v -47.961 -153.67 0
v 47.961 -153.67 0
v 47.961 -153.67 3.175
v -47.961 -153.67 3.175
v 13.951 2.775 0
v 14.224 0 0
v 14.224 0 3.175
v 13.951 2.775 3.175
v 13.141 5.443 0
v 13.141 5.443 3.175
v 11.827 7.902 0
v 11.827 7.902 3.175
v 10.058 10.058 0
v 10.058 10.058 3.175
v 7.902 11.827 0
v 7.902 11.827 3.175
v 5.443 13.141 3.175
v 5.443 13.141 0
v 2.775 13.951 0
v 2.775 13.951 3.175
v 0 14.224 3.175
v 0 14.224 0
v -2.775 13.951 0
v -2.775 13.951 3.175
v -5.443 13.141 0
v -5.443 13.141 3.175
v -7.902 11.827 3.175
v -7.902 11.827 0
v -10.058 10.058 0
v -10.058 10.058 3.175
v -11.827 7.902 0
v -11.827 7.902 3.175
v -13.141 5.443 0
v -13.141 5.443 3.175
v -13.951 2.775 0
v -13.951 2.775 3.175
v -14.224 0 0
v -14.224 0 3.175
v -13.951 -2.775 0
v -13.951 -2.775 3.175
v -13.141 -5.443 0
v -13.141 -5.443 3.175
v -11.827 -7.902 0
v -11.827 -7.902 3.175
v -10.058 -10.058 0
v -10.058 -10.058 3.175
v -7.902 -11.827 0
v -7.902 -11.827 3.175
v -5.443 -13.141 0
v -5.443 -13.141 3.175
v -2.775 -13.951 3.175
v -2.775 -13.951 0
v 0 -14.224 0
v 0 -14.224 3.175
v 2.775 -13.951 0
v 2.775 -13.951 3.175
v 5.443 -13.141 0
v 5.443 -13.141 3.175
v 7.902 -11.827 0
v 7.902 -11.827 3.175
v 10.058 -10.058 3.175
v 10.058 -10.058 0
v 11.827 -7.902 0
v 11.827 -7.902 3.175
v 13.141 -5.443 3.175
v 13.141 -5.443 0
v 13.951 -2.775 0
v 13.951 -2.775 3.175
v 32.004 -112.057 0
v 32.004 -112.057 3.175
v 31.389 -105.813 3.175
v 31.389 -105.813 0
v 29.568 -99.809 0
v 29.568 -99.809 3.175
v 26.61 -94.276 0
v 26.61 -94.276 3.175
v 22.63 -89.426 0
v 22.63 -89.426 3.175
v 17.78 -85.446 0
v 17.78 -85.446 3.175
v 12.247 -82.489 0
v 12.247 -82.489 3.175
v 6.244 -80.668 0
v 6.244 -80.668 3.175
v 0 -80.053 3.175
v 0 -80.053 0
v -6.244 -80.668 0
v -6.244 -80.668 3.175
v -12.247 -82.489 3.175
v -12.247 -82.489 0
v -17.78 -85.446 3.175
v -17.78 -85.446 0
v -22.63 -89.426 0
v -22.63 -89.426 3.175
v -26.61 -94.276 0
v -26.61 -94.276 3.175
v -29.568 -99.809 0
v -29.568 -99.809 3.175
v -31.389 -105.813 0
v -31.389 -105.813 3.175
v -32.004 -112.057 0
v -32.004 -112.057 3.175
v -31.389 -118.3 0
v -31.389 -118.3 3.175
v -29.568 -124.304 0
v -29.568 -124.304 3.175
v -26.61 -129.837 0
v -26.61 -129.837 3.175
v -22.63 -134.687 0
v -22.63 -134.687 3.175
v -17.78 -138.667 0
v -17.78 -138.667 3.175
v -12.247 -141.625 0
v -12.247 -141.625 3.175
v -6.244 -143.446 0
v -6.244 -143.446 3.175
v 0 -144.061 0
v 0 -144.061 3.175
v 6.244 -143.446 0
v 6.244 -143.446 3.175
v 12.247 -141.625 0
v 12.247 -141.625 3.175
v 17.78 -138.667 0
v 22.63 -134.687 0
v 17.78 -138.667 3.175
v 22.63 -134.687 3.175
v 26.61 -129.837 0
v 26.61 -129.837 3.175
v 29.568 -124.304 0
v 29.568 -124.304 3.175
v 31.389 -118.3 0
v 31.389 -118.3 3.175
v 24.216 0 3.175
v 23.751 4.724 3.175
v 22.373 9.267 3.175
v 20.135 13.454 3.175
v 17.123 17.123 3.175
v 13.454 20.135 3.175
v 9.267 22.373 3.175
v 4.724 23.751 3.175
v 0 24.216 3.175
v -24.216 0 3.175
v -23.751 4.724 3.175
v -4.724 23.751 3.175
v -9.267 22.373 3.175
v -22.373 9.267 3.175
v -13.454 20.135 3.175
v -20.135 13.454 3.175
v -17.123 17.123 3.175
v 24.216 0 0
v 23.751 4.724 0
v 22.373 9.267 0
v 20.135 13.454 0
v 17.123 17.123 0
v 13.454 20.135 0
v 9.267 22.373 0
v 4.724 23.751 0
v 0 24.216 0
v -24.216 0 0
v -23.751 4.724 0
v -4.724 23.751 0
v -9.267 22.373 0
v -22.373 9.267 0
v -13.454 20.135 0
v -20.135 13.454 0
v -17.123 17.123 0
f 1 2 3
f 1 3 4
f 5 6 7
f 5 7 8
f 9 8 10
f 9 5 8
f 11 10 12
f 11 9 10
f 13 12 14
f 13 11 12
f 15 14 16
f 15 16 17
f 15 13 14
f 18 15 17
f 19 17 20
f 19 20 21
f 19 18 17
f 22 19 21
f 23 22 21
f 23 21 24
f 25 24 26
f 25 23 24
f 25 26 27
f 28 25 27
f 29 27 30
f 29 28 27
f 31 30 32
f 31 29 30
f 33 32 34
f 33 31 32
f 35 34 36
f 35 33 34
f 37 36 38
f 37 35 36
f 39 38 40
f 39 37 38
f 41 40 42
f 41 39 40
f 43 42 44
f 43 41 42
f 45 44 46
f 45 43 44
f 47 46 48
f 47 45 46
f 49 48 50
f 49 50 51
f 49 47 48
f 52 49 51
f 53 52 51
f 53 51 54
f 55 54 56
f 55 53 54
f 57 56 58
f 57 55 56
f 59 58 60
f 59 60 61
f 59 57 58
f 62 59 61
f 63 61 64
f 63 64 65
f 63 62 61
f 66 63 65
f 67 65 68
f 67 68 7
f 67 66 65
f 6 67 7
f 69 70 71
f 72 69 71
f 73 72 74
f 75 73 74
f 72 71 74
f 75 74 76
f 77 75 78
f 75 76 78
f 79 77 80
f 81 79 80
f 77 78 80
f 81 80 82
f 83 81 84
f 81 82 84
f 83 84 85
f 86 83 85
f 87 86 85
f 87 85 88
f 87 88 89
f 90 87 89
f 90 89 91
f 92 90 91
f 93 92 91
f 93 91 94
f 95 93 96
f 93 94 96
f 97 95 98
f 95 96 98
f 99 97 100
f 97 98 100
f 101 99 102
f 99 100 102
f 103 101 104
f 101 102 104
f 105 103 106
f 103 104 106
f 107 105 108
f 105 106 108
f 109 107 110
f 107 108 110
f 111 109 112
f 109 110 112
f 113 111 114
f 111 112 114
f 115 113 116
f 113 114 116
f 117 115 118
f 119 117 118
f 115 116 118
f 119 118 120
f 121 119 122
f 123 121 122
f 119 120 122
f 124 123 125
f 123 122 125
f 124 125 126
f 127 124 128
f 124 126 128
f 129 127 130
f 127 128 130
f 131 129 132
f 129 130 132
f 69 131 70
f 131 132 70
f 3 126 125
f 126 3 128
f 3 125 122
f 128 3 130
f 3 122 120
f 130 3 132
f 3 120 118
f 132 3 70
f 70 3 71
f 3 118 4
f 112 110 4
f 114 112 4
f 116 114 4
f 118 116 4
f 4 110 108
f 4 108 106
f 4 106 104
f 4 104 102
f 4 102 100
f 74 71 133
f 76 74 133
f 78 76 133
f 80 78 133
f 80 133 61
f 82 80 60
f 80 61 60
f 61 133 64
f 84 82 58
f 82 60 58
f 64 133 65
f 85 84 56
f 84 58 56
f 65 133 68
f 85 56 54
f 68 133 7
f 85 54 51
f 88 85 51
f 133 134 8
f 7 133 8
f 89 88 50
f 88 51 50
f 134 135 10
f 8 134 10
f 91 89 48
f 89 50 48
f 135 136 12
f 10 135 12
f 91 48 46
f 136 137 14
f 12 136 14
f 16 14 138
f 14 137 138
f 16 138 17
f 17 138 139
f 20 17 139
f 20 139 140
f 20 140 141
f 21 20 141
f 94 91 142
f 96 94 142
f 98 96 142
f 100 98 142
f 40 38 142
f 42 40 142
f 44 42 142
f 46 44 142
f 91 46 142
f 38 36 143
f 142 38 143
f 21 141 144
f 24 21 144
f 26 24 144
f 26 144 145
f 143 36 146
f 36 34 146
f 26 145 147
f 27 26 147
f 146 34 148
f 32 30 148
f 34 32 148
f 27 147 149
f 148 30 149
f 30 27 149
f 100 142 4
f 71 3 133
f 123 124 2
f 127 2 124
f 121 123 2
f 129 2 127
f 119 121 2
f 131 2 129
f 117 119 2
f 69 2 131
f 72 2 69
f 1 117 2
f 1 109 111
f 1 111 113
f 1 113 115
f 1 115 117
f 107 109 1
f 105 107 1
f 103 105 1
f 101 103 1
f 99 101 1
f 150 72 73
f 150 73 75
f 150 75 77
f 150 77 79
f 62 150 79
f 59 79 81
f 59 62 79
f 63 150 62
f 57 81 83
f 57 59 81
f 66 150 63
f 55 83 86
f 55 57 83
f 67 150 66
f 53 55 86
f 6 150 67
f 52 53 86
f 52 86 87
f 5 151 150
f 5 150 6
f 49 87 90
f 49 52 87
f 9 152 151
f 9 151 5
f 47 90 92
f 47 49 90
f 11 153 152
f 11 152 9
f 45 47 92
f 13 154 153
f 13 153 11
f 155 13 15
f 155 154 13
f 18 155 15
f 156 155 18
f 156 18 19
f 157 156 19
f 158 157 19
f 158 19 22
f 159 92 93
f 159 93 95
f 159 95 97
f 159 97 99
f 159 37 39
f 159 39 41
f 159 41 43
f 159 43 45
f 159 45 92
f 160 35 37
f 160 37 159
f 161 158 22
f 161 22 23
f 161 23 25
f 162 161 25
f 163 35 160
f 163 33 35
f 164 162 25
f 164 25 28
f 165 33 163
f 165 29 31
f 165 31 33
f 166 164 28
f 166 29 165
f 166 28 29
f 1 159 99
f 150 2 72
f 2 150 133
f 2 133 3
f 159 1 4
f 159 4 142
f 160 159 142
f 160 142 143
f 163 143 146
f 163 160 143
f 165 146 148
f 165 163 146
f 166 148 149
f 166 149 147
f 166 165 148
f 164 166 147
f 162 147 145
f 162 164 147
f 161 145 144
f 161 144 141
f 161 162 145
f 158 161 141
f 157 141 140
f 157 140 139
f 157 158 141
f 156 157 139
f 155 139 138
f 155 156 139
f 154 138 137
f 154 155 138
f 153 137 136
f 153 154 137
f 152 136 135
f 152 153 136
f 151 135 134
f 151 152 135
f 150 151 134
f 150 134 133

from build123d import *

# Parameters (mm, degrees)
SKETCH1_R           = 14.224
BOSS_EXTRUDE1_DEPTH = 3.175
SKETCH2_R           = 32.004
CUT_EXTRUDE1_DEPTH  = 3.175


with BuildPart() as part:
    # Sketch1 → Boss-Extrude1 (new body)
    with BuildSketch(Plane.XY):
        with BuildLine():
            Line((47.961011706, -153.67), (-47.961011706, -153.67))
            Line((-47.961011706, -153.67), (-24.216066116, 0))
            ThreePointArc((-24.216066116, 0), (0, 24.216066116), (24.216066116, 0))
            Line((24.216066116, 0), (47.961011706, -153.67))
        make_face()
        Circle(SKETCH1_R, mode=Mode.SUBTRACT)
    extrude(amount=BOSS_EXTRUDE1_DEPTH)

    # Sketch2 → Cut-Extrude1 (cut)
    with BuildSketch(Plane.XY.offset(3.175)):
        with Locations((0, -112.056738627)):
            Circle(SKETCH2_R)
    extrude(amount=-CUT_EXTRUDE1_DEPTH, mode=Mode.SUBTRACT)


solid = part.part
